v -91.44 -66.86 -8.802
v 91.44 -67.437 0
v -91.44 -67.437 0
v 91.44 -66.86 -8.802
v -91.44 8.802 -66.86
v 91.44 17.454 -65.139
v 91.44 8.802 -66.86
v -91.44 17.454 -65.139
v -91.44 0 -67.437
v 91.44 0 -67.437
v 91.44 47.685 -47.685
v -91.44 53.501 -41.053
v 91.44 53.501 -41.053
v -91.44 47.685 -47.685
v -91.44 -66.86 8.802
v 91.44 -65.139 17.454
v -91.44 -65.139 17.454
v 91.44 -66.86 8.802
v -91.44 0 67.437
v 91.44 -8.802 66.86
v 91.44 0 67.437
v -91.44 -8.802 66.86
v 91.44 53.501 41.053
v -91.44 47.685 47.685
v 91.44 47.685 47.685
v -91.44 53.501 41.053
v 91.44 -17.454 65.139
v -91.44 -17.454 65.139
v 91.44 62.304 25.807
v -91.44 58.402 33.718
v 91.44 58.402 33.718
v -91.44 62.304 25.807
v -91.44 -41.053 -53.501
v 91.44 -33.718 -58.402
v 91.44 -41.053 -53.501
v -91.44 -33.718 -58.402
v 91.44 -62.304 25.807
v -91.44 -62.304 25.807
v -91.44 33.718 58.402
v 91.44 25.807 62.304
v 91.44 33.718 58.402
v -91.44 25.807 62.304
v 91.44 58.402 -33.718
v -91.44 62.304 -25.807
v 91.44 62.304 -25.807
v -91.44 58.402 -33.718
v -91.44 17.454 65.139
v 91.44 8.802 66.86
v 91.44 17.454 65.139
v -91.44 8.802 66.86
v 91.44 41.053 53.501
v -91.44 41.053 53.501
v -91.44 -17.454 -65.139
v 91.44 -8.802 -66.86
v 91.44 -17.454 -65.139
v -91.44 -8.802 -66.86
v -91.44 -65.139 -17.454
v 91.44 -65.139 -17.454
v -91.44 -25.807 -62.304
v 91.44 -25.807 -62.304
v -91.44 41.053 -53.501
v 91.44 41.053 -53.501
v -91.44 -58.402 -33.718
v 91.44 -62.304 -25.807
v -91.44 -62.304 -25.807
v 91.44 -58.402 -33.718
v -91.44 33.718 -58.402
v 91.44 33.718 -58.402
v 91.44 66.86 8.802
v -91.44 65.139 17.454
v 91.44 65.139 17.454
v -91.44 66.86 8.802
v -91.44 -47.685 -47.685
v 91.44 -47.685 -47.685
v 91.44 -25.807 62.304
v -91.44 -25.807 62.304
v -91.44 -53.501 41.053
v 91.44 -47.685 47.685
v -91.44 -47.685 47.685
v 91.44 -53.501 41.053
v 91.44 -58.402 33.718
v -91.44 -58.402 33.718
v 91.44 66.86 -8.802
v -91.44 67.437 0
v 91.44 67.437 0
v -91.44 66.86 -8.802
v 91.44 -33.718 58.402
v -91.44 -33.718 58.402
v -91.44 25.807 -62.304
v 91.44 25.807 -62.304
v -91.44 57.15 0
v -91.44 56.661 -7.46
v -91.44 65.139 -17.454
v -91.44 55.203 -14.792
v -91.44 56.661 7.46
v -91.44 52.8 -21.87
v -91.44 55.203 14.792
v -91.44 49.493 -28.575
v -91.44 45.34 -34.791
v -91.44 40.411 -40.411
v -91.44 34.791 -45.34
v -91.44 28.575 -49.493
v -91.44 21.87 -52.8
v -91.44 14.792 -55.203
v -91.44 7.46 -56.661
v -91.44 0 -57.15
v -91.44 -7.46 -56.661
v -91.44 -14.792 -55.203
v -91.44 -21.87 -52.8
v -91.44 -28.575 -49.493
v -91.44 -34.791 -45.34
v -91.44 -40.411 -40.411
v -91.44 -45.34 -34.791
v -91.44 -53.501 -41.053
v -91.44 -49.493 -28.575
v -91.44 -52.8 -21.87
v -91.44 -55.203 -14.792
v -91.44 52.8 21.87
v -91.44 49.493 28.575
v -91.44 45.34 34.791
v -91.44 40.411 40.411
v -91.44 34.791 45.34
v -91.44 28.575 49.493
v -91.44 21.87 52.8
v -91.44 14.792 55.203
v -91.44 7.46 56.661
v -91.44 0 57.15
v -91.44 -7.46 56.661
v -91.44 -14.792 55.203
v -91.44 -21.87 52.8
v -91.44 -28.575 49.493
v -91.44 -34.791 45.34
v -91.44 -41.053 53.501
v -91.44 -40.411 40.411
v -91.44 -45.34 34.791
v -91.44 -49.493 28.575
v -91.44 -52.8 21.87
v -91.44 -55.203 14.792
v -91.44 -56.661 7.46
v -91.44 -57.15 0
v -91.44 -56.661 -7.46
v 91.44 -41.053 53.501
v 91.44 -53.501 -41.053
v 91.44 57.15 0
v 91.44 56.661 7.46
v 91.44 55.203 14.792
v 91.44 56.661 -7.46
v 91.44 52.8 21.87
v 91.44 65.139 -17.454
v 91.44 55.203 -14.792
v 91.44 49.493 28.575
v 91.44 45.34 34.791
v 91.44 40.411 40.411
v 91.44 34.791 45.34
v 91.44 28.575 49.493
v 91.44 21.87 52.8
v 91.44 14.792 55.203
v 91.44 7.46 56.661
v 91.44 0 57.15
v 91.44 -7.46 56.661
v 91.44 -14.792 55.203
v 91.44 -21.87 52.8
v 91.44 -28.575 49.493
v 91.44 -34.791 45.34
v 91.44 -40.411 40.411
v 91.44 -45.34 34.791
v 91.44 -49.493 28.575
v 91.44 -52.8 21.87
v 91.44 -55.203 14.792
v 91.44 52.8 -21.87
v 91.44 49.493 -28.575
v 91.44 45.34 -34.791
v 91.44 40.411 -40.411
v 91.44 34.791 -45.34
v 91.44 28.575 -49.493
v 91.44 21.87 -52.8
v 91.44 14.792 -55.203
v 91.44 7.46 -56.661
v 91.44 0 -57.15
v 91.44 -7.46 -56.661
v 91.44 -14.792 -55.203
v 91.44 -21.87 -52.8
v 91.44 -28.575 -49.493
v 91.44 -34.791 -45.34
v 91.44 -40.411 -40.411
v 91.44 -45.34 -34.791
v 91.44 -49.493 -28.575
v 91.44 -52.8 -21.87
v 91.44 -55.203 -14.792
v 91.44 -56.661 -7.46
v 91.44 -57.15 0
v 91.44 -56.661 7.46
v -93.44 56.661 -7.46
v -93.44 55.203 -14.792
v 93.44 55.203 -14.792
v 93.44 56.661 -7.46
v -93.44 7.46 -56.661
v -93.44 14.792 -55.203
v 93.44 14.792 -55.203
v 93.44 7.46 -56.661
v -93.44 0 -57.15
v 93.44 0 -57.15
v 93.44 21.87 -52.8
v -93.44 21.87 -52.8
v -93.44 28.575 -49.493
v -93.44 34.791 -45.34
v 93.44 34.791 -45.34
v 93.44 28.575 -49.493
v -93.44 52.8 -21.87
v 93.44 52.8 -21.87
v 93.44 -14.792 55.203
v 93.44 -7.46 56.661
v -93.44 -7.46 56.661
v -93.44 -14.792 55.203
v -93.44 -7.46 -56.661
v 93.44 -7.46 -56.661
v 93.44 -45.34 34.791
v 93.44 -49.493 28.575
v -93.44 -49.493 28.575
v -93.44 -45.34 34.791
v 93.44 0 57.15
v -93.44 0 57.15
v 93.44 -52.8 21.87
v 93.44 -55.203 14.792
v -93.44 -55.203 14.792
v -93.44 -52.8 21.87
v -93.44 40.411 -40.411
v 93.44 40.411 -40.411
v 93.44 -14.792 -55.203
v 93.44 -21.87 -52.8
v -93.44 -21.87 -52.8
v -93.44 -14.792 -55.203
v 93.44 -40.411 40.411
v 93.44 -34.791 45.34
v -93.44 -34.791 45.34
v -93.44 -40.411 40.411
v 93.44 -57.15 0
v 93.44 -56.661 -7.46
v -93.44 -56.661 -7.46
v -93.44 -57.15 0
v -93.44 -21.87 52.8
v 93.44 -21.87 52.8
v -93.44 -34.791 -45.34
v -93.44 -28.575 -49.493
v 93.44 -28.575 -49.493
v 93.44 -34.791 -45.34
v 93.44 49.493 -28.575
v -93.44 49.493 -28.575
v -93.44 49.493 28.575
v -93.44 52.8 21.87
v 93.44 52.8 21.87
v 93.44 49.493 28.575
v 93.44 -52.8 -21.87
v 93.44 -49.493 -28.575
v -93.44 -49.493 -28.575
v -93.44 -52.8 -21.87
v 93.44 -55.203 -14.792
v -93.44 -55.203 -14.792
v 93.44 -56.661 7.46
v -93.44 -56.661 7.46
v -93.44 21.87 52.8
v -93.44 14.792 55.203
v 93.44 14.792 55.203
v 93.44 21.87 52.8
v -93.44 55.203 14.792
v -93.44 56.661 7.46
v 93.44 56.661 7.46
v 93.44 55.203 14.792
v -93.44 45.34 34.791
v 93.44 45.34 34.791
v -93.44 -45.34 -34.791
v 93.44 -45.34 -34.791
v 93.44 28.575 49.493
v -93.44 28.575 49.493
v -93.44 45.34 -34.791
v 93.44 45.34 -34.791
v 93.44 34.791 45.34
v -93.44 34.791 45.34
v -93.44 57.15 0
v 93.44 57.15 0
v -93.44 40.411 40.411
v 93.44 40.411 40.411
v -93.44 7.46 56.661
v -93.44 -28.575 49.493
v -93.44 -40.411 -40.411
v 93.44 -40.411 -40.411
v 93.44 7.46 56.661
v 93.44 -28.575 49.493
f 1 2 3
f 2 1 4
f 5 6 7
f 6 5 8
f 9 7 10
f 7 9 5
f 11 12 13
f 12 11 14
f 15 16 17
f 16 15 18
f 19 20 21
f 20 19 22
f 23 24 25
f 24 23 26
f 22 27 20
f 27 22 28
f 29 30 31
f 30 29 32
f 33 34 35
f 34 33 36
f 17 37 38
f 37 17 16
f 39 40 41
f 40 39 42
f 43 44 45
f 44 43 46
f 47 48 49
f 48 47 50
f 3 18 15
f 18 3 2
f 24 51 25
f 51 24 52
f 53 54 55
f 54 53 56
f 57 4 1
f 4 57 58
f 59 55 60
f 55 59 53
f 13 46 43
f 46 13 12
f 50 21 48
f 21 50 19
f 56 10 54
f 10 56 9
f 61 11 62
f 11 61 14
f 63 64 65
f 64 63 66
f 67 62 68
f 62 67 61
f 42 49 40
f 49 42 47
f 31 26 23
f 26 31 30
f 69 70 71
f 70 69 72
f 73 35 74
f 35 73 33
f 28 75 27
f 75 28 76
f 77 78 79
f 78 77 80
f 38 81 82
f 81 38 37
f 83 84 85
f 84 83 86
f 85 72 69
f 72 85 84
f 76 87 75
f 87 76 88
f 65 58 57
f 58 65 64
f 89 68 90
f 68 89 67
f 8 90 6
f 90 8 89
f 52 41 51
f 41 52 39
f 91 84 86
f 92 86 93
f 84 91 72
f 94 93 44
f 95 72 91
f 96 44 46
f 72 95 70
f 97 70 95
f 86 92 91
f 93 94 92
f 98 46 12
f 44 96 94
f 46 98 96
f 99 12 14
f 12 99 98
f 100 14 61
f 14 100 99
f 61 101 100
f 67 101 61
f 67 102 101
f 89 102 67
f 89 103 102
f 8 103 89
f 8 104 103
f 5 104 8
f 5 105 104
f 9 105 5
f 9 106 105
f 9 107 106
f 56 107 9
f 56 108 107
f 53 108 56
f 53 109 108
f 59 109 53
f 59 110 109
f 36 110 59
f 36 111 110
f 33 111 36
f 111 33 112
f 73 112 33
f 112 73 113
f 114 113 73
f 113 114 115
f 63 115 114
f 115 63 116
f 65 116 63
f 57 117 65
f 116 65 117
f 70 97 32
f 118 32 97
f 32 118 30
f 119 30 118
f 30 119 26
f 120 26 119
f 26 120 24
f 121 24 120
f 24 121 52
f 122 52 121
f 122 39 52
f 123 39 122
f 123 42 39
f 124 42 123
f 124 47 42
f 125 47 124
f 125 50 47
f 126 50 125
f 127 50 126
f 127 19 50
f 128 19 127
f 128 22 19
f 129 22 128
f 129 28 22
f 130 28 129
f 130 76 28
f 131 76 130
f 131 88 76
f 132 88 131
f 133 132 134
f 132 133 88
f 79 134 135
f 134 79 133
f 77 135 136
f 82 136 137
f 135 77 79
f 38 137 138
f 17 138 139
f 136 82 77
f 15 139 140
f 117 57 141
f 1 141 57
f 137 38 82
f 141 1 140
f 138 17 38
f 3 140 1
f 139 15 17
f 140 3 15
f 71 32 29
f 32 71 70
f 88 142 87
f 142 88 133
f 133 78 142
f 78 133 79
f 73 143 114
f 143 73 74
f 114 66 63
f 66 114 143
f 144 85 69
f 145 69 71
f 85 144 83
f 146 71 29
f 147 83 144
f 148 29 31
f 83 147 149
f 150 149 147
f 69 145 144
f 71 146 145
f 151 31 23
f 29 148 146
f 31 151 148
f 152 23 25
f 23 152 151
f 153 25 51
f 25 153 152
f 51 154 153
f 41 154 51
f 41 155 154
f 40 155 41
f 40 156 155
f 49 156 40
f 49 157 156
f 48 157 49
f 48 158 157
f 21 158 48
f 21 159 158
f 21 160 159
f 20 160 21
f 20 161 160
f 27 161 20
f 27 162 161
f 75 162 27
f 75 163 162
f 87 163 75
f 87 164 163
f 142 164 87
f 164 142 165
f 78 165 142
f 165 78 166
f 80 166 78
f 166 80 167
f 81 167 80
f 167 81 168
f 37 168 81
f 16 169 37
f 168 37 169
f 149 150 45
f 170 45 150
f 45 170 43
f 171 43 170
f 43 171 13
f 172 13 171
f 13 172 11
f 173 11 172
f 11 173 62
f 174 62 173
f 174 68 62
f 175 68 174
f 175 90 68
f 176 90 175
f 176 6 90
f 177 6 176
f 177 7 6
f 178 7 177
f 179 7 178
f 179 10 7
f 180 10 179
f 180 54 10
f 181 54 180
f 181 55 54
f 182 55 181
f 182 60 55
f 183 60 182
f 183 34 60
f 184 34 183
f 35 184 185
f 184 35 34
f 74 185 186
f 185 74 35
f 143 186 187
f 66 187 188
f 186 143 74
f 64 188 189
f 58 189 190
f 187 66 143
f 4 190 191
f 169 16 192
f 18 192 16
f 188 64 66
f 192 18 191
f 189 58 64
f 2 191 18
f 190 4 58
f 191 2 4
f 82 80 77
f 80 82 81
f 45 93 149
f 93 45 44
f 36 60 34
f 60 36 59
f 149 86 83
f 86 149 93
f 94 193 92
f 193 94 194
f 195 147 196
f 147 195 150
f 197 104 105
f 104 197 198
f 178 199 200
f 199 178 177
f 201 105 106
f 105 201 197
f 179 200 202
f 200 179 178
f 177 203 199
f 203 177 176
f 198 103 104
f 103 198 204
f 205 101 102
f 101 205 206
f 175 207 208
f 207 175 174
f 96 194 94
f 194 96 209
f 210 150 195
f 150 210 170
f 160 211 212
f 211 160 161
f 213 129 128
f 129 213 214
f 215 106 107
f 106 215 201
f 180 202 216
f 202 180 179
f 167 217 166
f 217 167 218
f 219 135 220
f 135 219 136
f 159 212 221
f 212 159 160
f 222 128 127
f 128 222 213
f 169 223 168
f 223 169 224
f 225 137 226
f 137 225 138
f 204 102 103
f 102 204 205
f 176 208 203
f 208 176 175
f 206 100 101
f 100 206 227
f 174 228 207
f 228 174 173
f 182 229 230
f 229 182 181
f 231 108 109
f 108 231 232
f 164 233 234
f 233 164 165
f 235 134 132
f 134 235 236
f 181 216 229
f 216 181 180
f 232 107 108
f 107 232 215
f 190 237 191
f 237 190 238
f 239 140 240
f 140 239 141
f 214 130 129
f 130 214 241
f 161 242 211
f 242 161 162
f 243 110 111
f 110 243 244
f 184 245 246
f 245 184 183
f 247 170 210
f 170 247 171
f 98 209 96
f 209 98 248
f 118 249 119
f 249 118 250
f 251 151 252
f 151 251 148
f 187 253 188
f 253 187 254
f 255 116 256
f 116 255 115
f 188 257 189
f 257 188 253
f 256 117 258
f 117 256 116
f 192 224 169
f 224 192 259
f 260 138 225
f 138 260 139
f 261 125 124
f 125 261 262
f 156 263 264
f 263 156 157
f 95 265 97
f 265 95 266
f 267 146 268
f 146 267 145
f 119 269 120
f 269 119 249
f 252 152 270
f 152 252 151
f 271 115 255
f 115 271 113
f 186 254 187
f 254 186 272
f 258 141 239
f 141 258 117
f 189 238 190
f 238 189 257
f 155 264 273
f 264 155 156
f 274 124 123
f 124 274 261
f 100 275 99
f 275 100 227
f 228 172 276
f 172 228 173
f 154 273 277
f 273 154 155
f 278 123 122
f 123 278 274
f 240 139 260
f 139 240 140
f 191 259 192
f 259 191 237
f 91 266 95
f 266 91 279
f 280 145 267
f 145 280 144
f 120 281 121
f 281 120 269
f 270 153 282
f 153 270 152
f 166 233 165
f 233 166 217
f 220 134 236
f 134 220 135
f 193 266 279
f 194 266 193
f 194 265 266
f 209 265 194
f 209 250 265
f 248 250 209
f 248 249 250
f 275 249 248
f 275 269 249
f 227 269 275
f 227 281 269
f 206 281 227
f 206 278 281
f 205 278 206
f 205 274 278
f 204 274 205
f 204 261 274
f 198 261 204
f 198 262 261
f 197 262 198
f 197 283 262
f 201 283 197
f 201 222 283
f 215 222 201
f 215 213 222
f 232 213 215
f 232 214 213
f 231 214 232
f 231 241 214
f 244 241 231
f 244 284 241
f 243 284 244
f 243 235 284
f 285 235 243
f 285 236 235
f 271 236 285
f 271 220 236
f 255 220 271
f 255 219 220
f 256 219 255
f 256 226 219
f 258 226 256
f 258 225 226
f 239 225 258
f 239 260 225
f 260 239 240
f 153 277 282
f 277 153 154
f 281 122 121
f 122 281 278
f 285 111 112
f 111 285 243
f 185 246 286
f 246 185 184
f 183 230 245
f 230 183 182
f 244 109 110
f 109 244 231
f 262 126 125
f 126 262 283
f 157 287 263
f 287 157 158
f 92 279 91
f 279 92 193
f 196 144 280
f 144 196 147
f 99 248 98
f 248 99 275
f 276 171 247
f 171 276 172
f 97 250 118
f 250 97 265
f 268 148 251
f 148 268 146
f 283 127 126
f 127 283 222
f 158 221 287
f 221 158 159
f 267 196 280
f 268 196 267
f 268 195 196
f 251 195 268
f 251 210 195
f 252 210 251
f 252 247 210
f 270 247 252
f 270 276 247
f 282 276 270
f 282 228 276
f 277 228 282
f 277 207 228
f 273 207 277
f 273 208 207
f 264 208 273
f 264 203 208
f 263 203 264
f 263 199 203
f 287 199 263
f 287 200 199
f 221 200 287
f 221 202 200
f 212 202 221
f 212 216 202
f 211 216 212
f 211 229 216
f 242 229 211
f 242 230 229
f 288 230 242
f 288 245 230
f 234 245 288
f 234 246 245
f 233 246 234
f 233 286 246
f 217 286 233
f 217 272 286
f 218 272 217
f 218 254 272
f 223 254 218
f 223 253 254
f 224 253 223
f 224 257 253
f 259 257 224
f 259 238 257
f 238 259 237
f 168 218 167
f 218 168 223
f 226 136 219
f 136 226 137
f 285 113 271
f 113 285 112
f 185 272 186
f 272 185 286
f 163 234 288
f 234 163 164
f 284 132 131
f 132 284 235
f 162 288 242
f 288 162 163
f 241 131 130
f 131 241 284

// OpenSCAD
// Auto-generated by scripts/author_from_manifest.py (Phase D.3).
// Source: data/phase_d_manifest.json (sku_intent='victaulic-005-rigid-coupling-4in').
// Do not hand-edit — regenerate from the manifest.
//
// @part victaulic_005_rigid_coupling_4in
// @kind fitting
// @category fitting.coupling
// @display-name "Victaulic FireLock Style 005 Rigid Coupling 4\""
// @mfg victaulic
// @mfg-pn Style_005_4in
// @listing UL FM
// @price-usd 40.00
// @install-minutes 6
// @crew journeyman
// @param size_in number default=4 label="Size" unit="in"
// @port inlet position=[-0.05,0,0] direction=[-1,0,0] style=grooved size_in=4 role=run_a
// @port outlet position=[0.05,0,0] direction=[1,0,0] style=grooved size_in=4 role=run_b

size_in = 4.0;

function od_mm(nps) =
    nps ==   1  ? 33.4 :
    nps == 1.25 ? 42.2 :
    nps == 1.5  ? 48.3 :
    nps ==   2  ? 60.3 :
    nps == 2.5  ? 73.0 :
    nps ==   3  ? 88.9 :
    nps ==   4  ? 114.3 :
    nps ==   5  ? 141.3 :
    nps ==   6  ? 168.3 :
    nps ==   8  ? 219.1 :
    nps ==  10  ? 273.0 : 60.3;

od = od_mm(size_in);
len_mm = od * 1.6;

rotate([0, 90, 0])
    union() {
        cylinder(h = len_mm, d = od * 1.18, center = true, $fn = 48);
        cylinder(h = len_mm + 4, d = od, center = true, $fn = 48);
    }
